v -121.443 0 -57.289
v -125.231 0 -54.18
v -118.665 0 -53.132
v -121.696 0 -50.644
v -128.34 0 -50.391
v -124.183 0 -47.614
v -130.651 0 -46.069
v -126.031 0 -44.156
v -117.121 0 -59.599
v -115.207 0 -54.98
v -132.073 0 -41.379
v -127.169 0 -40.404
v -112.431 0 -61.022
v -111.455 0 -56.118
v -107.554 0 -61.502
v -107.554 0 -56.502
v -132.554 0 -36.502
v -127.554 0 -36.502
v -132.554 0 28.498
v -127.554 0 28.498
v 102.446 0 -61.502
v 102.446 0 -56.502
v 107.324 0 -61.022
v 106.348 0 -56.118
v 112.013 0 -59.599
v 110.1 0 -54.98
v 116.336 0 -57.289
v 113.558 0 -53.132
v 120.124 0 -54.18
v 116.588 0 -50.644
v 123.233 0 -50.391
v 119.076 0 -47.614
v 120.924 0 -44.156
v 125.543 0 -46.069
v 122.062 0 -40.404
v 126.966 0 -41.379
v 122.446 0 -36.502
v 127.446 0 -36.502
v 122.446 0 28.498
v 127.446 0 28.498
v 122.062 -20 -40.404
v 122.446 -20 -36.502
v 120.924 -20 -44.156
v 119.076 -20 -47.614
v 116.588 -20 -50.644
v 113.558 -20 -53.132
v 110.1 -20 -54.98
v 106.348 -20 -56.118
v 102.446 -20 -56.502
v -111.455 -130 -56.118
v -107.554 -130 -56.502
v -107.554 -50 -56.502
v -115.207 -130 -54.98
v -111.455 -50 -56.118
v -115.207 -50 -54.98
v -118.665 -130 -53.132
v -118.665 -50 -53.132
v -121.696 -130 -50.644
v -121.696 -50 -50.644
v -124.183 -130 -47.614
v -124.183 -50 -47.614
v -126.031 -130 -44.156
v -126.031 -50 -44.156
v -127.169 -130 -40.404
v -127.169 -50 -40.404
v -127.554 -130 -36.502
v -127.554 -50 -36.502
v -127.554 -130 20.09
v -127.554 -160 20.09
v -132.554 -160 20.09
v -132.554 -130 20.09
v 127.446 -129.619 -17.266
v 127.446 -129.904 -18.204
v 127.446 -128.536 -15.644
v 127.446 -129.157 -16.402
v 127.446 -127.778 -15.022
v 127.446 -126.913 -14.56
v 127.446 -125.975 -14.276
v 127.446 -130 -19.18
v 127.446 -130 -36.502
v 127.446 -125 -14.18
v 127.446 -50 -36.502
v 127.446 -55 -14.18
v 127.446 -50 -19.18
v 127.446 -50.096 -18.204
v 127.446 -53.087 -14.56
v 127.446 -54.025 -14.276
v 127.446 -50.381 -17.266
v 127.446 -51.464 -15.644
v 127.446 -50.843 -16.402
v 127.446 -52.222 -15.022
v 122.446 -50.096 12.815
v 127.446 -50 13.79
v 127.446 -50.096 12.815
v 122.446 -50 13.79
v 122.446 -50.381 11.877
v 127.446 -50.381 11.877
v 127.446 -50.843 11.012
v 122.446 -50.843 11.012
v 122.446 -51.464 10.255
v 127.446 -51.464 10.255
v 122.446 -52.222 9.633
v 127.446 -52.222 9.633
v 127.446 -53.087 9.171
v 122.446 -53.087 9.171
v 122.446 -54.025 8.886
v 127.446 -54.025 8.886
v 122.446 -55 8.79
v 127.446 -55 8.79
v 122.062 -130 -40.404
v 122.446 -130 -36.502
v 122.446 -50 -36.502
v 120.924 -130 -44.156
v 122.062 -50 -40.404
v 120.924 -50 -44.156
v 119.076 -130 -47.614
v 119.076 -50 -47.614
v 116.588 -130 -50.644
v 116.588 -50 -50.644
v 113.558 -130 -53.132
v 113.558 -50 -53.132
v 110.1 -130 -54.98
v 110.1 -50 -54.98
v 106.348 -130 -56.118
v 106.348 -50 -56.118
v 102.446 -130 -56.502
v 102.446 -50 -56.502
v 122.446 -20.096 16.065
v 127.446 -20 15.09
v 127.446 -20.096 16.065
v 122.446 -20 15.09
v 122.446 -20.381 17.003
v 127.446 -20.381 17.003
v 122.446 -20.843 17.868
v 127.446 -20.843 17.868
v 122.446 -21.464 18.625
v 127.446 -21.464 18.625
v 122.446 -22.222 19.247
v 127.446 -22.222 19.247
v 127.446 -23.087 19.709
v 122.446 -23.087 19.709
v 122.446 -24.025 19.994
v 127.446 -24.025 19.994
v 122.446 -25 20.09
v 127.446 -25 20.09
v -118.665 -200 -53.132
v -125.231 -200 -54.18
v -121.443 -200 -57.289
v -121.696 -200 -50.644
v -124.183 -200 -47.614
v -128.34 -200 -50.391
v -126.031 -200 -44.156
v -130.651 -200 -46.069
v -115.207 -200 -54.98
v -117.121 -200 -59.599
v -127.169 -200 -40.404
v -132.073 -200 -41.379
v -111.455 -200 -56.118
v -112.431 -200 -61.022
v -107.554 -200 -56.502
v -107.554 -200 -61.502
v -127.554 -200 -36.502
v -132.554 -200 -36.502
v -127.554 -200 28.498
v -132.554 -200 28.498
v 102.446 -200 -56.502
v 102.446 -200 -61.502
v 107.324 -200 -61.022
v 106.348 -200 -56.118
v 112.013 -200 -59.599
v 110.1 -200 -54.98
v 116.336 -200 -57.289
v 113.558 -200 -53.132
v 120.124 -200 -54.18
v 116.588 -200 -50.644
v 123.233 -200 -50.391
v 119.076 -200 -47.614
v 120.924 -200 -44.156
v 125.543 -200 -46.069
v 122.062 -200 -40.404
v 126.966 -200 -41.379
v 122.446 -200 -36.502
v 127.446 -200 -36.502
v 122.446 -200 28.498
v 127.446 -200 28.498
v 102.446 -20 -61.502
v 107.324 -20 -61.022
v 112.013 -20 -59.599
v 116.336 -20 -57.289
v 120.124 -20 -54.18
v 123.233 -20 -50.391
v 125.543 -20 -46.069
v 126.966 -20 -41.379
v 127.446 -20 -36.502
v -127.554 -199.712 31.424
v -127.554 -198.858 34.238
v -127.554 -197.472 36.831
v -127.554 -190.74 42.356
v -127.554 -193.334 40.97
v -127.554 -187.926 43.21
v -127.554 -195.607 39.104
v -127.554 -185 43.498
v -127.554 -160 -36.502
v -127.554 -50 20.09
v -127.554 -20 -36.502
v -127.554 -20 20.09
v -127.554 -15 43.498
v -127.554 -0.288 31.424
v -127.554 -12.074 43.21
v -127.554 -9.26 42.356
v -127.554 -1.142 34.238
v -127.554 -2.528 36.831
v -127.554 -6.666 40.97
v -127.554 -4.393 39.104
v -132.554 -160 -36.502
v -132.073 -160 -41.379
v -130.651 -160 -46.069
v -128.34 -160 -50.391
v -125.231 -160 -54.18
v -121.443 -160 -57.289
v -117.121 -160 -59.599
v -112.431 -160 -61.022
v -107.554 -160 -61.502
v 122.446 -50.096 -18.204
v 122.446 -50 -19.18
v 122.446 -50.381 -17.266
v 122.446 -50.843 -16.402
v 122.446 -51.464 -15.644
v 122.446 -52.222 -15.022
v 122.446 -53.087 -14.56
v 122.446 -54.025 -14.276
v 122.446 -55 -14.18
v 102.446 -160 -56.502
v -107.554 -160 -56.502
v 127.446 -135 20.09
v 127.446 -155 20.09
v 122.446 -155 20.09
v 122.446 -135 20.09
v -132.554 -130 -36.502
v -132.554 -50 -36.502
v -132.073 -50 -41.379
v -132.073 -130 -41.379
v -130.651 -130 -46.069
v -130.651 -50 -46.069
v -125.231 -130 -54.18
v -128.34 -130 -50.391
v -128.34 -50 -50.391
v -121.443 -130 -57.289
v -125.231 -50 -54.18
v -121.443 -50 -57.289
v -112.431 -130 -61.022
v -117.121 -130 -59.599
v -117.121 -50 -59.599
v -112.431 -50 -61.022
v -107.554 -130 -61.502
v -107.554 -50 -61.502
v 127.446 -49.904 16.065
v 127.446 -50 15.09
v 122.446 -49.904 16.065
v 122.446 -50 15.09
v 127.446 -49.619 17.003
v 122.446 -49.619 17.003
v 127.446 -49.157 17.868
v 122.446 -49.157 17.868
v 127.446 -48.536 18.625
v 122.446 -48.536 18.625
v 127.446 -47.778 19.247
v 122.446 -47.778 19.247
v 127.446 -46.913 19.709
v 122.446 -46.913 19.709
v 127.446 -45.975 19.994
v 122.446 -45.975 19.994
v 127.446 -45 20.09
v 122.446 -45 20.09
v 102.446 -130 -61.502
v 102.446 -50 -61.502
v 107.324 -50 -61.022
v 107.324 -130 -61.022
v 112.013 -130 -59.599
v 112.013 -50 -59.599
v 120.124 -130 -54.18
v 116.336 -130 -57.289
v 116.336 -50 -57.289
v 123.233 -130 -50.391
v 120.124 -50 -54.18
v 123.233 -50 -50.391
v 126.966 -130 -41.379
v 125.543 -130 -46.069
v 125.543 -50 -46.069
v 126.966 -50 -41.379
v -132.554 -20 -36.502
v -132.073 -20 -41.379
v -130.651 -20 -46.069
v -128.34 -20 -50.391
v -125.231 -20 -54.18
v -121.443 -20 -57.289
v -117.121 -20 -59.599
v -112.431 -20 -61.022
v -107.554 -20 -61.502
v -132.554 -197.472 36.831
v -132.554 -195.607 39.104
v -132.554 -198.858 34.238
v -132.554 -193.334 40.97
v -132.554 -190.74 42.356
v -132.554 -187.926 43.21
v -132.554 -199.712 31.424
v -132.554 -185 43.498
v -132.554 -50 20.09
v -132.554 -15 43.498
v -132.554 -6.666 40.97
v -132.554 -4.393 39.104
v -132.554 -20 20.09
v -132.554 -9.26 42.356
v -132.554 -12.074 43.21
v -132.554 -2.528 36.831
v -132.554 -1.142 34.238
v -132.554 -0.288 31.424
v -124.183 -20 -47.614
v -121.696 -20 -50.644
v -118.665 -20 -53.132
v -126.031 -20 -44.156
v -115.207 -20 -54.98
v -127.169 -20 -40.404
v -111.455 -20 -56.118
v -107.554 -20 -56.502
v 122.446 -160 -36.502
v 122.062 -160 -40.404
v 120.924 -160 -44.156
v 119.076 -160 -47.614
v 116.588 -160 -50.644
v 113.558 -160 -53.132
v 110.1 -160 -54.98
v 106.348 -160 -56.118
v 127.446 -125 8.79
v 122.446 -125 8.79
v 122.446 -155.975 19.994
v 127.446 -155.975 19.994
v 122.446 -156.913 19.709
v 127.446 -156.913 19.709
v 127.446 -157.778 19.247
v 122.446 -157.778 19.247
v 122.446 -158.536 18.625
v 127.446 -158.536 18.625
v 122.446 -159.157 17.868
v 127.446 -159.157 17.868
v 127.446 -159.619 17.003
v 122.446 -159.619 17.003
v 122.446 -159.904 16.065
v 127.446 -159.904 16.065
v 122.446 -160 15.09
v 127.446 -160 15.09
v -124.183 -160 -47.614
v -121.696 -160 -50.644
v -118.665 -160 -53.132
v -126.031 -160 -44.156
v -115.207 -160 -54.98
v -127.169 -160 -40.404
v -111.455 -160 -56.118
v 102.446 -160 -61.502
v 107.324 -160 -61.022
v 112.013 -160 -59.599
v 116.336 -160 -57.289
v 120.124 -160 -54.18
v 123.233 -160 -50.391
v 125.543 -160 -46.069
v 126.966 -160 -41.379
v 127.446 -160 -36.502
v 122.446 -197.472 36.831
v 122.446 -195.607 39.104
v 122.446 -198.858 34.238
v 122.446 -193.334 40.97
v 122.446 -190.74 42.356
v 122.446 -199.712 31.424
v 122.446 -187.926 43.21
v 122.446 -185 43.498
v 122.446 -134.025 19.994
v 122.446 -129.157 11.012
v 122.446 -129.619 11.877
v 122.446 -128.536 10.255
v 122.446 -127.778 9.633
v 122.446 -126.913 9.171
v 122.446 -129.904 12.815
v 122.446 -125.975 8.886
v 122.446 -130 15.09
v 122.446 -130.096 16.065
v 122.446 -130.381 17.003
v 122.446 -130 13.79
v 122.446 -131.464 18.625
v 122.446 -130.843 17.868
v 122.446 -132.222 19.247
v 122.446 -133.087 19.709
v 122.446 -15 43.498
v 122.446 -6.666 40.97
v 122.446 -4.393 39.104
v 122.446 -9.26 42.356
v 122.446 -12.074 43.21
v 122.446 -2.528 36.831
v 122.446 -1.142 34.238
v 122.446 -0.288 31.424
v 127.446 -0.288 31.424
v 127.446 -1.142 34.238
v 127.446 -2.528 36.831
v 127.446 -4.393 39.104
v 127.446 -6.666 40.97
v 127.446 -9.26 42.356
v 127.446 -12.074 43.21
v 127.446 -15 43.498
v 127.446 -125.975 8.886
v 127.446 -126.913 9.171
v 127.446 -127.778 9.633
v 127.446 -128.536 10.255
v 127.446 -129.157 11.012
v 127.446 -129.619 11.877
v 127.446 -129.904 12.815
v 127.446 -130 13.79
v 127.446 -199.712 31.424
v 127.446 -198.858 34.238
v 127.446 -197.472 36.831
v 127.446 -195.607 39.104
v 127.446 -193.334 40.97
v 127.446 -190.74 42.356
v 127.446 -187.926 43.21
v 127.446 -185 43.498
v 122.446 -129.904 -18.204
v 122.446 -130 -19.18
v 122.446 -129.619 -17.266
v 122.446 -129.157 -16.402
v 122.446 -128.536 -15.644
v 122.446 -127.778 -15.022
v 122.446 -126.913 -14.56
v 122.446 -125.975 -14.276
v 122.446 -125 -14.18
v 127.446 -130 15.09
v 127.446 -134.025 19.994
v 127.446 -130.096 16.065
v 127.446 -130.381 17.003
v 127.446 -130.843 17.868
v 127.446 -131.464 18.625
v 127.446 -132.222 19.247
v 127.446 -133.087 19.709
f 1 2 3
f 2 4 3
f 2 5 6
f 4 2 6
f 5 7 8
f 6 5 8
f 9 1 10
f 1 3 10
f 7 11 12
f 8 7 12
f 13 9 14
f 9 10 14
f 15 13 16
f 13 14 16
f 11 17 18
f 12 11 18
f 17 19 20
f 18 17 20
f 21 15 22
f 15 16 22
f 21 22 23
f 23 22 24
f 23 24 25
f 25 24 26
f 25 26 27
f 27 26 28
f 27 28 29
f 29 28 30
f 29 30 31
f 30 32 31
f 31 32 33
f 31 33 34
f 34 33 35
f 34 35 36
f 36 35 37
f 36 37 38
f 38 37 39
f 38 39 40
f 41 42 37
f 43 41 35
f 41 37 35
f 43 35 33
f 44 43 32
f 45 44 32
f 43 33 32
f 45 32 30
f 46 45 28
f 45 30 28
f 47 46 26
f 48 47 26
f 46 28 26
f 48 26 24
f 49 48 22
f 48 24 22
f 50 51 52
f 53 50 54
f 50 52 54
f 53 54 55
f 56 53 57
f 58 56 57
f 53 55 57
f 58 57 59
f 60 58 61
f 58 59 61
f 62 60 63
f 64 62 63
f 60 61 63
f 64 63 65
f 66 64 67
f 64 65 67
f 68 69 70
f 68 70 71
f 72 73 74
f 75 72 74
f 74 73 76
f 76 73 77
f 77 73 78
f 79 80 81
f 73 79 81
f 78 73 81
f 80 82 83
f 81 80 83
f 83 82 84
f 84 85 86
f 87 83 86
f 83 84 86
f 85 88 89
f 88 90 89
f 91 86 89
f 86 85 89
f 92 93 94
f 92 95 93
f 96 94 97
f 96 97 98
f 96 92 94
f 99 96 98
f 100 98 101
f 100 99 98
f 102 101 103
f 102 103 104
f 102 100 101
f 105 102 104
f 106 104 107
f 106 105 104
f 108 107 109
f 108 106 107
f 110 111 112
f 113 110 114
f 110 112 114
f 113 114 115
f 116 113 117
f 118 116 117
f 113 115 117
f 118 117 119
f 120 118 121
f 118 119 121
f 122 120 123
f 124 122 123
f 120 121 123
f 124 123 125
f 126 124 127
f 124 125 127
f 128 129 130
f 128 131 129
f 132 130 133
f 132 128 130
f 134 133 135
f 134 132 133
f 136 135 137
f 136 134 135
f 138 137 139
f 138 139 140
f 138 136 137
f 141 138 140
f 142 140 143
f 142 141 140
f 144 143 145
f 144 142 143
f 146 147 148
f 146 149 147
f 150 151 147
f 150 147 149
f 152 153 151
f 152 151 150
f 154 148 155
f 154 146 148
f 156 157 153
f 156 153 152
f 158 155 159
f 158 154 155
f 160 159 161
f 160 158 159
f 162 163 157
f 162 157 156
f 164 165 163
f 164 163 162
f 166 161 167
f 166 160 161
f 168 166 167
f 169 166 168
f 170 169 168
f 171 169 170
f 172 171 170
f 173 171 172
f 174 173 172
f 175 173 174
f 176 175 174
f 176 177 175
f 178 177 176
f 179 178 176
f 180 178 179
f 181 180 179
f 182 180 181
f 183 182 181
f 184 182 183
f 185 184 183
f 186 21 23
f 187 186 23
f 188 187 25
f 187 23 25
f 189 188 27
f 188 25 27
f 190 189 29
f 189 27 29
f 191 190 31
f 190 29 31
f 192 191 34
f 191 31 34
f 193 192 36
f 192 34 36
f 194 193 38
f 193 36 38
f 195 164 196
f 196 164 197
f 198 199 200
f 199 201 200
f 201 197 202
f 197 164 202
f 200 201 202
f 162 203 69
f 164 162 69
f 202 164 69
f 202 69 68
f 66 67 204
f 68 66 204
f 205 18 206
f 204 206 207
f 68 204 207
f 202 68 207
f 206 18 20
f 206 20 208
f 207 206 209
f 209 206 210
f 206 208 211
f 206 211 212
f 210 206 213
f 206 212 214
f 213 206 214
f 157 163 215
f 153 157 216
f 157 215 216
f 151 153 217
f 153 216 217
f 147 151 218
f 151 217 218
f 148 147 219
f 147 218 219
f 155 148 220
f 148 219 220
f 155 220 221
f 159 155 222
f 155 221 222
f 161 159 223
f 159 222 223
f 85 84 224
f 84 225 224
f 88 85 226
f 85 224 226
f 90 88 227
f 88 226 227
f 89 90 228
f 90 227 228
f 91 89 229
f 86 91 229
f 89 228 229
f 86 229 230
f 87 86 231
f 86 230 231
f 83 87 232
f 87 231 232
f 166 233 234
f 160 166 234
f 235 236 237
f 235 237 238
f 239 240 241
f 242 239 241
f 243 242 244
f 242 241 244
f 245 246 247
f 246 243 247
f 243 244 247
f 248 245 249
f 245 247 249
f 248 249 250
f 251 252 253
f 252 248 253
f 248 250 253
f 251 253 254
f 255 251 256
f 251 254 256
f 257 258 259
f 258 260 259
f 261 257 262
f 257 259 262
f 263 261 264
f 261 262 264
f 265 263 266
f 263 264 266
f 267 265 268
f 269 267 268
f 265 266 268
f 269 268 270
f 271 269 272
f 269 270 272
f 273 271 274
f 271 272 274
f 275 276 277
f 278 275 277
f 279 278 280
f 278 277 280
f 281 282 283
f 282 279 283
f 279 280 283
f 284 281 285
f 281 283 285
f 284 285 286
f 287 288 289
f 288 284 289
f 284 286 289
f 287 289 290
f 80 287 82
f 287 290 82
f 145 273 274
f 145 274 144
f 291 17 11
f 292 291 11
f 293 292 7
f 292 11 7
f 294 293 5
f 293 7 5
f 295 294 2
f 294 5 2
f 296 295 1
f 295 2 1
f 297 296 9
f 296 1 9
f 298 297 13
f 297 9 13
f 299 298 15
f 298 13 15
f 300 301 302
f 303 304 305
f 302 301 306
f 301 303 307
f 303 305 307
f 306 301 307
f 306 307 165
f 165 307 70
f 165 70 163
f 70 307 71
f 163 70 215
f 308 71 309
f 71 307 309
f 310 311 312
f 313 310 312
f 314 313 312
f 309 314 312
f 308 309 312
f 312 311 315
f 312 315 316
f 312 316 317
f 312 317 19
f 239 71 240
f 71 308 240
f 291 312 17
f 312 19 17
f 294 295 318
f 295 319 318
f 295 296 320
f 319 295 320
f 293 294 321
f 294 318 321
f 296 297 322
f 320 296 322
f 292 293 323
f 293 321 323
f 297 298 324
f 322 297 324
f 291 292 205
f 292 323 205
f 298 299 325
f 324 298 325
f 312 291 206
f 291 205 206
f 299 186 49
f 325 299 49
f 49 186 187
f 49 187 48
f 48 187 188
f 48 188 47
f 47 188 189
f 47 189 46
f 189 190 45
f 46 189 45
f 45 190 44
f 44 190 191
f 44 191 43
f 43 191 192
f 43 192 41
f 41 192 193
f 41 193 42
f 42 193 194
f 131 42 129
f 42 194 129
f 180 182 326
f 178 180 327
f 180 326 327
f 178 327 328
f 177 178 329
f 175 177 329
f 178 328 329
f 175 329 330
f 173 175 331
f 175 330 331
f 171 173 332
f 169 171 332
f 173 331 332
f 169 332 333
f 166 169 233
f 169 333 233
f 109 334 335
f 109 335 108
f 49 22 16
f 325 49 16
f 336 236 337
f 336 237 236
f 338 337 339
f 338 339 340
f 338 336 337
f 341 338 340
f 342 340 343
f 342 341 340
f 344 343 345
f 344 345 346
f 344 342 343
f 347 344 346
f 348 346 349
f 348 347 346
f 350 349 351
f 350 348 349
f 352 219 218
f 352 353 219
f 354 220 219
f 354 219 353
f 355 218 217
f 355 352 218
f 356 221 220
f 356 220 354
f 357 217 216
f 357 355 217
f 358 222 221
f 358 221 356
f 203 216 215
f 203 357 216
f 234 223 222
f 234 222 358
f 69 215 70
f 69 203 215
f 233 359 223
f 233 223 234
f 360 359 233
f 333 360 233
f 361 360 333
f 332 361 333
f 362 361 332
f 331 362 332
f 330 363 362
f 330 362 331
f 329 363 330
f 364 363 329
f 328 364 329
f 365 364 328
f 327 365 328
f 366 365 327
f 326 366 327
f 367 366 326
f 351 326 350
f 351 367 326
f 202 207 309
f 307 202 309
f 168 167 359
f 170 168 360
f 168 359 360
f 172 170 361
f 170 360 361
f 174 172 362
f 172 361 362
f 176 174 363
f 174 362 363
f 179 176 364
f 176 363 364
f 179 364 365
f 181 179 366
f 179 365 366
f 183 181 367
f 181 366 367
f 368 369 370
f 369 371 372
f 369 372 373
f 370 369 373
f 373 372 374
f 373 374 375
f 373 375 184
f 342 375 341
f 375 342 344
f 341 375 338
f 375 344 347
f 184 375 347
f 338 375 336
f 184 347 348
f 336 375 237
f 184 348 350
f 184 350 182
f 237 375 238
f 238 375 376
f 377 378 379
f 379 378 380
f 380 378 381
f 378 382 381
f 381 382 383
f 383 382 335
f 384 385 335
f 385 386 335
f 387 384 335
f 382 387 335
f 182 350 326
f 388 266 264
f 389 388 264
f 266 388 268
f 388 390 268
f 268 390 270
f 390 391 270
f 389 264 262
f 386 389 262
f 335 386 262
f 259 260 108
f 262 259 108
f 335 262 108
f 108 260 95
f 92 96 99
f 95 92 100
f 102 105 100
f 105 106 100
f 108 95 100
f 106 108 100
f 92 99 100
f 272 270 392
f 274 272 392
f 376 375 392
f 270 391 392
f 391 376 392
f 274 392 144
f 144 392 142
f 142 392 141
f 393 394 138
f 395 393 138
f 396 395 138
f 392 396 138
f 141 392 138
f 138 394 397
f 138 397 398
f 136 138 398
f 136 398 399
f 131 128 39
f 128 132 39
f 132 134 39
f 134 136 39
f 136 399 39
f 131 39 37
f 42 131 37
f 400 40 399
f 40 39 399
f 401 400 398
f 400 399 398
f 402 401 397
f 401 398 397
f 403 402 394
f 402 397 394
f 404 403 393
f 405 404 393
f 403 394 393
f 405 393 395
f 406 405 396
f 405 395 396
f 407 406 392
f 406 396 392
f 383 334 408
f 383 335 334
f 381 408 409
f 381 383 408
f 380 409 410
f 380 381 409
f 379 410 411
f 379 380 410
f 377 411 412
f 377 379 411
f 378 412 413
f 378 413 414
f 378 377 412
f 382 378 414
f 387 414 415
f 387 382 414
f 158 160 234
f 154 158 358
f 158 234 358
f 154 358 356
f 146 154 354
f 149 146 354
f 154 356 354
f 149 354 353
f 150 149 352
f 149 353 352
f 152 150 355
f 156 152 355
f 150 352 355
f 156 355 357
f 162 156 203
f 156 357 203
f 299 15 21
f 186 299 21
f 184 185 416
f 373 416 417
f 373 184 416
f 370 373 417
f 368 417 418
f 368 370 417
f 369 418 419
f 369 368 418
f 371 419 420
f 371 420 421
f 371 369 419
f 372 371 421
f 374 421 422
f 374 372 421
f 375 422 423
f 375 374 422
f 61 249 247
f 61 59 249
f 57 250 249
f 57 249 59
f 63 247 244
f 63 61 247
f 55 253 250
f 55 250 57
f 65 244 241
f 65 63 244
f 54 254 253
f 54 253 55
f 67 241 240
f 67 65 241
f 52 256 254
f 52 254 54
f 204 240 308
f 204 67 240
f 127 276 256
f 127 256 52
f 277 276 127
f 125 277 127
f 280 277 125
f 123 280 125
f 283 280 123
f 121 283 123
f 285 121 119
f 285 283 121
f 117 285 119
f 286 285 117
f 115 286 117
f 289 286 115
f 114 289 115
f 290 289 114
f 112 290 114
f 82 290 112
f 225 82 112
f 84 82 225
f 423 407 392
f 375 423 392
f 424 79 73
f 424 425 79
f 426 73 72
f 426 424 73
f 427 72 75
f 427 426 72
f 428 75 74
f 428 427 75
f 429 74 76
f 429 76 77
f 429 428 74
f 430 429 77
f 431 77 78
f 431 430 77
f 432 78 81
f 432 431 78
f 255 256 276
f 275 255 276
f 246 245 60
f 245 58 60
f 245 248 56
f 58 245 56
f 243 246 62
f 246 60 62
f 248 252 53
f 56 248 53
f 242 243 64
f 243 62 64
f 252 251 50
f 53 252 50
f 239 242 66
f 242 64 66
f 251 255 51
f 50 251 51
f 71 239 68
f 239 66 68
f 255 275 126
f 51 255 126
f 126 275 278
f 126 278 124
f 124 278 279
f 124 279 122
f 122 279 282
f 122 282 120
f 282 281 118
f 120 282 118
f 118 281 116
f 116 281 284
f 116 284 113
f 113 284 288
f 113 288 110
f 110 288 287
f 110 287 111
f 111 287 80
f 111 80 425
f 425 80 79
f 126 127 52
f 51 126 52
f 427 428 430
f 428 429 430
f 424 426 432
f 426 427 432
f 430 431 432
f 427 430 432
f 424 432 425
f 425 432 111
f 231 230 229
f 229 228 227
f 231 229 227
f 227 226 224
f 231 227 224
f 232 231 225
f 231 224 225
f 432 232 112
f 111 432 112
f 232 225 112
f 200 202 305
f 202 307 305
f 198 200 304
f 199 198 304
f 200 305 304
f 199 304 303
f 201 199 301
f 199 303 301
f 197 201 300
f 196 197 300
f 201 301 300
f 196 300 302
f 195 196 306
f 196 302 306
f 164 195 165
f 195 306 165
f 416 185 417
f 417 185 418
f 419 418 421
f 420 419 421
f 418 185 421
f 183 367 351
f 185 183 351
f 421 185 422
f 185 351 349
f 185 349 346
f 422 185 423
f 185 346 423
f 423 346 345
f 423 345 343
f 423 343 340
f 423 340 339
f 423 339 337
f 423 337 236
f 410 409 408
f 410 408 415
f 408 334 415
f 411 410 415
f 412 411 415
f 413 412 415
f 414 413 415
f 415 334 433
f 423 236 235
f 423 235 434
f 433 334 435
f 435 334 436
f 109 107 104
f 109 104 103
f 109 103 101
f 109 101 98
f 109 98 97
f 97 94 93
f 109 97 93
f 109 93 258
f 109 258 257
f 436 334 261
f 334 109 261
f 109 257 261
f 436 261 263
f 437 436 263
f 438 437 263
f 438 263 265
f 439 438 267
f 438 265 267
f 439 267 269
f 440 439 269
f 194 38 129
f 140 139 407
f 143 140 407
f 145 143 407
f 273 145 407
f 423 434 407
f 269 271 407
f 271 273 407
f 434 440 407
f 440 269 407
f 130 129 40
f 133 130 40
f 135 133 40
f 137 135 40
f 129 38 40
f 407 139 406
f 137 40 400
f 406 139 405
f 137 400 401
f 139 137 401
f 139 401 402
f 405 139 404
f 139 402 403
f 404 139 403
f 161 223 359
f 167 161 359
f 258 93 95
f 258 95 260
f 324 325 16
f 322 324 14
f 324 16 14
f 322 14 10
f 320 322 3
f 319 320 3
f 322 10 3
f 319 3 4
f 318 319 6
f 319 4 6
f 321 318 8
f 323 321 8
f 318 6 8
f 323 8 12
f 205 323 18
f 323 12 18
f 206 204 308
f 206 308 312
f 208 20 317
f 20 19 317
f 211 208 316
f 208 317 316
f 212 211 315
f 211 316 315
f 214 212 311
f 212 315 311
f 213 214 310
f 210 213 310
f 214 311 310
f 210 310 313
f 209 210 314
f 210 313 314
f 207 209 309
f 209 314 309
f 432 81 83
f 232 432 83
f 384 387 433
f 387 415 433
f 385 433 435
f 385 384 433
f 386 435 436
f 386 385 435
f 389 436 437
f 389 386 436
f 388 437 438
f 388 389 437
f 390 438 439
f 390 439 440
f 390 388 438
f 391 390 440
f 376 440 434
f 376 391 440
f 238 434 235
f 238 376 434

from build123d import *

# Parameters (mm, degrees)
F2_DEPTH = 200
F3_W     = 30
F3_H     = 100
F4_DEPTH = 500
F6_R     = 15
F7_R     = 5
F8_W     = 101.1056527495
F8_H     = 22.9697218165
F9_DEPTH = 200
F10_R    = 5


with BuildPart() as f2:
    # F0 (on Front) → F2 (new body)
    with BuildSketch(Plane.XZ):
        with BuildLine():
            Line((-127.5536519289, -36.5021181107), (-127.5536519289, 43.4978818893))
            Line((-127.5536519289, 43.4978818893), (-132.5536519289, 43.4978818893))
            Line((-132.5536519289, 43.4978818893), (-132.5536519289, -36.5021181107))
            ThreePointArc((-132.5536519289, -36.5021181107), (-125.2313214586, -54.1797876403), (-107.5536519289, -61.5021181107))
            Line((-107.5536519289, -61.5021181107), (102.4463480711, -61.5021181107))
            ThreePointArc((102.4463480711, -61.5021181107), (120.1240176008, -54.1797876403), (127.4463480711, -36.5021181107))
            Line((127.4463480711, -36.5021181107), (127.4463480711, 43.4978818893))
            Line((127.4463480711, 43.4978818893), (122.4463480711, 43.4978818893))
            Line((122.4463480711, 43.4978818893), (122.4463480711, -36.5021181107))
            ThreePointArc((122.4463480711, -36.5021181107), (116.5884836948, -50.6442537344), (102.4463480711, -56.5021181107))
            Line((102.4463480711, -56.5021181107), (-107.5536519289, -56.5021181107))
            ThreePointArc((-107.5536519289, -56.5021181107), (-121.6957875526, -50.6442537344), (-127.5536519289, -36.5021181107))
        make_face()
    extrude(amount=F2_DEPTH)


with BuildPart() as f4:
    # F3 (on offset) → F4 (new body)
    with BuildSketch(Plane.YZ.offset(200)):
        with Locations((-145, -29.9103426556)):
            Rectangle(F3_W, F3_H)
    extrude(amount=-F4_DEPTH)


with BuildPart() as f4b:
    # F3 (on offset) → F4, piece 2 (new body)
    with BuildSketch(Plane.YZ.offset(200)):
        with Locations((-35, -29.9103426556)):
            Rectangle(F3_W, F3_H)
    extrude(amount=-F4_DEPTH)


with BuildPart() as f2_1:
    add(f2.part)

    # F5: cut F4, F4b
    add(f4.part, mode=Mode.SUBTRACT)
    add(f4b.part, mode=Mode.SUBTRACT)

    # F6
    f6_edges = [f2_1.edges().sort_by_distance(p)[0] for p in [
        (-130.053652, -200, 43.497882),
        (-130.053652, 0, 43.497882),
        (124.946348, -200, 43.497882),
        (124.946348, 0, 43.497882),
    ]]
    fillet(f6_edges, radius=F6_R)

    # F7
    f7_edges = [f2_1.edges().sort_by_distance(p)[0] for p in [
        (124.946348, -20, 20.089657),
        (124.946348, -50, 20.089657),
    ]]
    fillet(f7_edges, radius=F7_R)

    # F8 (on offset) → F9 (cut)
    with BuildSketch(Plane.YZ.offset(200)):
        with Locations((-91.6927345097, -2.6946733706)):
            Rectangle(F8_W, F8_H)
    extrude(amount=-F9_DEPTH, mode=Mode.SUBTRACT)

    # F10
    f10_edges = [f2_1.edges().sort_by_distance(p)[0] for p in [
        (124.946348, -50, -14.179534),
        (124.946348, -50, 8.790188),
        (124.946348, -130, 8.790188),
        (124.946348, -130, -14.179534),
        (124.946348, -130, 20.089657),
        (124.946348, -160, 20.089657),
    ]]
    fillet(f10_edges, radius=F10_R)


solid = f2_1.part
